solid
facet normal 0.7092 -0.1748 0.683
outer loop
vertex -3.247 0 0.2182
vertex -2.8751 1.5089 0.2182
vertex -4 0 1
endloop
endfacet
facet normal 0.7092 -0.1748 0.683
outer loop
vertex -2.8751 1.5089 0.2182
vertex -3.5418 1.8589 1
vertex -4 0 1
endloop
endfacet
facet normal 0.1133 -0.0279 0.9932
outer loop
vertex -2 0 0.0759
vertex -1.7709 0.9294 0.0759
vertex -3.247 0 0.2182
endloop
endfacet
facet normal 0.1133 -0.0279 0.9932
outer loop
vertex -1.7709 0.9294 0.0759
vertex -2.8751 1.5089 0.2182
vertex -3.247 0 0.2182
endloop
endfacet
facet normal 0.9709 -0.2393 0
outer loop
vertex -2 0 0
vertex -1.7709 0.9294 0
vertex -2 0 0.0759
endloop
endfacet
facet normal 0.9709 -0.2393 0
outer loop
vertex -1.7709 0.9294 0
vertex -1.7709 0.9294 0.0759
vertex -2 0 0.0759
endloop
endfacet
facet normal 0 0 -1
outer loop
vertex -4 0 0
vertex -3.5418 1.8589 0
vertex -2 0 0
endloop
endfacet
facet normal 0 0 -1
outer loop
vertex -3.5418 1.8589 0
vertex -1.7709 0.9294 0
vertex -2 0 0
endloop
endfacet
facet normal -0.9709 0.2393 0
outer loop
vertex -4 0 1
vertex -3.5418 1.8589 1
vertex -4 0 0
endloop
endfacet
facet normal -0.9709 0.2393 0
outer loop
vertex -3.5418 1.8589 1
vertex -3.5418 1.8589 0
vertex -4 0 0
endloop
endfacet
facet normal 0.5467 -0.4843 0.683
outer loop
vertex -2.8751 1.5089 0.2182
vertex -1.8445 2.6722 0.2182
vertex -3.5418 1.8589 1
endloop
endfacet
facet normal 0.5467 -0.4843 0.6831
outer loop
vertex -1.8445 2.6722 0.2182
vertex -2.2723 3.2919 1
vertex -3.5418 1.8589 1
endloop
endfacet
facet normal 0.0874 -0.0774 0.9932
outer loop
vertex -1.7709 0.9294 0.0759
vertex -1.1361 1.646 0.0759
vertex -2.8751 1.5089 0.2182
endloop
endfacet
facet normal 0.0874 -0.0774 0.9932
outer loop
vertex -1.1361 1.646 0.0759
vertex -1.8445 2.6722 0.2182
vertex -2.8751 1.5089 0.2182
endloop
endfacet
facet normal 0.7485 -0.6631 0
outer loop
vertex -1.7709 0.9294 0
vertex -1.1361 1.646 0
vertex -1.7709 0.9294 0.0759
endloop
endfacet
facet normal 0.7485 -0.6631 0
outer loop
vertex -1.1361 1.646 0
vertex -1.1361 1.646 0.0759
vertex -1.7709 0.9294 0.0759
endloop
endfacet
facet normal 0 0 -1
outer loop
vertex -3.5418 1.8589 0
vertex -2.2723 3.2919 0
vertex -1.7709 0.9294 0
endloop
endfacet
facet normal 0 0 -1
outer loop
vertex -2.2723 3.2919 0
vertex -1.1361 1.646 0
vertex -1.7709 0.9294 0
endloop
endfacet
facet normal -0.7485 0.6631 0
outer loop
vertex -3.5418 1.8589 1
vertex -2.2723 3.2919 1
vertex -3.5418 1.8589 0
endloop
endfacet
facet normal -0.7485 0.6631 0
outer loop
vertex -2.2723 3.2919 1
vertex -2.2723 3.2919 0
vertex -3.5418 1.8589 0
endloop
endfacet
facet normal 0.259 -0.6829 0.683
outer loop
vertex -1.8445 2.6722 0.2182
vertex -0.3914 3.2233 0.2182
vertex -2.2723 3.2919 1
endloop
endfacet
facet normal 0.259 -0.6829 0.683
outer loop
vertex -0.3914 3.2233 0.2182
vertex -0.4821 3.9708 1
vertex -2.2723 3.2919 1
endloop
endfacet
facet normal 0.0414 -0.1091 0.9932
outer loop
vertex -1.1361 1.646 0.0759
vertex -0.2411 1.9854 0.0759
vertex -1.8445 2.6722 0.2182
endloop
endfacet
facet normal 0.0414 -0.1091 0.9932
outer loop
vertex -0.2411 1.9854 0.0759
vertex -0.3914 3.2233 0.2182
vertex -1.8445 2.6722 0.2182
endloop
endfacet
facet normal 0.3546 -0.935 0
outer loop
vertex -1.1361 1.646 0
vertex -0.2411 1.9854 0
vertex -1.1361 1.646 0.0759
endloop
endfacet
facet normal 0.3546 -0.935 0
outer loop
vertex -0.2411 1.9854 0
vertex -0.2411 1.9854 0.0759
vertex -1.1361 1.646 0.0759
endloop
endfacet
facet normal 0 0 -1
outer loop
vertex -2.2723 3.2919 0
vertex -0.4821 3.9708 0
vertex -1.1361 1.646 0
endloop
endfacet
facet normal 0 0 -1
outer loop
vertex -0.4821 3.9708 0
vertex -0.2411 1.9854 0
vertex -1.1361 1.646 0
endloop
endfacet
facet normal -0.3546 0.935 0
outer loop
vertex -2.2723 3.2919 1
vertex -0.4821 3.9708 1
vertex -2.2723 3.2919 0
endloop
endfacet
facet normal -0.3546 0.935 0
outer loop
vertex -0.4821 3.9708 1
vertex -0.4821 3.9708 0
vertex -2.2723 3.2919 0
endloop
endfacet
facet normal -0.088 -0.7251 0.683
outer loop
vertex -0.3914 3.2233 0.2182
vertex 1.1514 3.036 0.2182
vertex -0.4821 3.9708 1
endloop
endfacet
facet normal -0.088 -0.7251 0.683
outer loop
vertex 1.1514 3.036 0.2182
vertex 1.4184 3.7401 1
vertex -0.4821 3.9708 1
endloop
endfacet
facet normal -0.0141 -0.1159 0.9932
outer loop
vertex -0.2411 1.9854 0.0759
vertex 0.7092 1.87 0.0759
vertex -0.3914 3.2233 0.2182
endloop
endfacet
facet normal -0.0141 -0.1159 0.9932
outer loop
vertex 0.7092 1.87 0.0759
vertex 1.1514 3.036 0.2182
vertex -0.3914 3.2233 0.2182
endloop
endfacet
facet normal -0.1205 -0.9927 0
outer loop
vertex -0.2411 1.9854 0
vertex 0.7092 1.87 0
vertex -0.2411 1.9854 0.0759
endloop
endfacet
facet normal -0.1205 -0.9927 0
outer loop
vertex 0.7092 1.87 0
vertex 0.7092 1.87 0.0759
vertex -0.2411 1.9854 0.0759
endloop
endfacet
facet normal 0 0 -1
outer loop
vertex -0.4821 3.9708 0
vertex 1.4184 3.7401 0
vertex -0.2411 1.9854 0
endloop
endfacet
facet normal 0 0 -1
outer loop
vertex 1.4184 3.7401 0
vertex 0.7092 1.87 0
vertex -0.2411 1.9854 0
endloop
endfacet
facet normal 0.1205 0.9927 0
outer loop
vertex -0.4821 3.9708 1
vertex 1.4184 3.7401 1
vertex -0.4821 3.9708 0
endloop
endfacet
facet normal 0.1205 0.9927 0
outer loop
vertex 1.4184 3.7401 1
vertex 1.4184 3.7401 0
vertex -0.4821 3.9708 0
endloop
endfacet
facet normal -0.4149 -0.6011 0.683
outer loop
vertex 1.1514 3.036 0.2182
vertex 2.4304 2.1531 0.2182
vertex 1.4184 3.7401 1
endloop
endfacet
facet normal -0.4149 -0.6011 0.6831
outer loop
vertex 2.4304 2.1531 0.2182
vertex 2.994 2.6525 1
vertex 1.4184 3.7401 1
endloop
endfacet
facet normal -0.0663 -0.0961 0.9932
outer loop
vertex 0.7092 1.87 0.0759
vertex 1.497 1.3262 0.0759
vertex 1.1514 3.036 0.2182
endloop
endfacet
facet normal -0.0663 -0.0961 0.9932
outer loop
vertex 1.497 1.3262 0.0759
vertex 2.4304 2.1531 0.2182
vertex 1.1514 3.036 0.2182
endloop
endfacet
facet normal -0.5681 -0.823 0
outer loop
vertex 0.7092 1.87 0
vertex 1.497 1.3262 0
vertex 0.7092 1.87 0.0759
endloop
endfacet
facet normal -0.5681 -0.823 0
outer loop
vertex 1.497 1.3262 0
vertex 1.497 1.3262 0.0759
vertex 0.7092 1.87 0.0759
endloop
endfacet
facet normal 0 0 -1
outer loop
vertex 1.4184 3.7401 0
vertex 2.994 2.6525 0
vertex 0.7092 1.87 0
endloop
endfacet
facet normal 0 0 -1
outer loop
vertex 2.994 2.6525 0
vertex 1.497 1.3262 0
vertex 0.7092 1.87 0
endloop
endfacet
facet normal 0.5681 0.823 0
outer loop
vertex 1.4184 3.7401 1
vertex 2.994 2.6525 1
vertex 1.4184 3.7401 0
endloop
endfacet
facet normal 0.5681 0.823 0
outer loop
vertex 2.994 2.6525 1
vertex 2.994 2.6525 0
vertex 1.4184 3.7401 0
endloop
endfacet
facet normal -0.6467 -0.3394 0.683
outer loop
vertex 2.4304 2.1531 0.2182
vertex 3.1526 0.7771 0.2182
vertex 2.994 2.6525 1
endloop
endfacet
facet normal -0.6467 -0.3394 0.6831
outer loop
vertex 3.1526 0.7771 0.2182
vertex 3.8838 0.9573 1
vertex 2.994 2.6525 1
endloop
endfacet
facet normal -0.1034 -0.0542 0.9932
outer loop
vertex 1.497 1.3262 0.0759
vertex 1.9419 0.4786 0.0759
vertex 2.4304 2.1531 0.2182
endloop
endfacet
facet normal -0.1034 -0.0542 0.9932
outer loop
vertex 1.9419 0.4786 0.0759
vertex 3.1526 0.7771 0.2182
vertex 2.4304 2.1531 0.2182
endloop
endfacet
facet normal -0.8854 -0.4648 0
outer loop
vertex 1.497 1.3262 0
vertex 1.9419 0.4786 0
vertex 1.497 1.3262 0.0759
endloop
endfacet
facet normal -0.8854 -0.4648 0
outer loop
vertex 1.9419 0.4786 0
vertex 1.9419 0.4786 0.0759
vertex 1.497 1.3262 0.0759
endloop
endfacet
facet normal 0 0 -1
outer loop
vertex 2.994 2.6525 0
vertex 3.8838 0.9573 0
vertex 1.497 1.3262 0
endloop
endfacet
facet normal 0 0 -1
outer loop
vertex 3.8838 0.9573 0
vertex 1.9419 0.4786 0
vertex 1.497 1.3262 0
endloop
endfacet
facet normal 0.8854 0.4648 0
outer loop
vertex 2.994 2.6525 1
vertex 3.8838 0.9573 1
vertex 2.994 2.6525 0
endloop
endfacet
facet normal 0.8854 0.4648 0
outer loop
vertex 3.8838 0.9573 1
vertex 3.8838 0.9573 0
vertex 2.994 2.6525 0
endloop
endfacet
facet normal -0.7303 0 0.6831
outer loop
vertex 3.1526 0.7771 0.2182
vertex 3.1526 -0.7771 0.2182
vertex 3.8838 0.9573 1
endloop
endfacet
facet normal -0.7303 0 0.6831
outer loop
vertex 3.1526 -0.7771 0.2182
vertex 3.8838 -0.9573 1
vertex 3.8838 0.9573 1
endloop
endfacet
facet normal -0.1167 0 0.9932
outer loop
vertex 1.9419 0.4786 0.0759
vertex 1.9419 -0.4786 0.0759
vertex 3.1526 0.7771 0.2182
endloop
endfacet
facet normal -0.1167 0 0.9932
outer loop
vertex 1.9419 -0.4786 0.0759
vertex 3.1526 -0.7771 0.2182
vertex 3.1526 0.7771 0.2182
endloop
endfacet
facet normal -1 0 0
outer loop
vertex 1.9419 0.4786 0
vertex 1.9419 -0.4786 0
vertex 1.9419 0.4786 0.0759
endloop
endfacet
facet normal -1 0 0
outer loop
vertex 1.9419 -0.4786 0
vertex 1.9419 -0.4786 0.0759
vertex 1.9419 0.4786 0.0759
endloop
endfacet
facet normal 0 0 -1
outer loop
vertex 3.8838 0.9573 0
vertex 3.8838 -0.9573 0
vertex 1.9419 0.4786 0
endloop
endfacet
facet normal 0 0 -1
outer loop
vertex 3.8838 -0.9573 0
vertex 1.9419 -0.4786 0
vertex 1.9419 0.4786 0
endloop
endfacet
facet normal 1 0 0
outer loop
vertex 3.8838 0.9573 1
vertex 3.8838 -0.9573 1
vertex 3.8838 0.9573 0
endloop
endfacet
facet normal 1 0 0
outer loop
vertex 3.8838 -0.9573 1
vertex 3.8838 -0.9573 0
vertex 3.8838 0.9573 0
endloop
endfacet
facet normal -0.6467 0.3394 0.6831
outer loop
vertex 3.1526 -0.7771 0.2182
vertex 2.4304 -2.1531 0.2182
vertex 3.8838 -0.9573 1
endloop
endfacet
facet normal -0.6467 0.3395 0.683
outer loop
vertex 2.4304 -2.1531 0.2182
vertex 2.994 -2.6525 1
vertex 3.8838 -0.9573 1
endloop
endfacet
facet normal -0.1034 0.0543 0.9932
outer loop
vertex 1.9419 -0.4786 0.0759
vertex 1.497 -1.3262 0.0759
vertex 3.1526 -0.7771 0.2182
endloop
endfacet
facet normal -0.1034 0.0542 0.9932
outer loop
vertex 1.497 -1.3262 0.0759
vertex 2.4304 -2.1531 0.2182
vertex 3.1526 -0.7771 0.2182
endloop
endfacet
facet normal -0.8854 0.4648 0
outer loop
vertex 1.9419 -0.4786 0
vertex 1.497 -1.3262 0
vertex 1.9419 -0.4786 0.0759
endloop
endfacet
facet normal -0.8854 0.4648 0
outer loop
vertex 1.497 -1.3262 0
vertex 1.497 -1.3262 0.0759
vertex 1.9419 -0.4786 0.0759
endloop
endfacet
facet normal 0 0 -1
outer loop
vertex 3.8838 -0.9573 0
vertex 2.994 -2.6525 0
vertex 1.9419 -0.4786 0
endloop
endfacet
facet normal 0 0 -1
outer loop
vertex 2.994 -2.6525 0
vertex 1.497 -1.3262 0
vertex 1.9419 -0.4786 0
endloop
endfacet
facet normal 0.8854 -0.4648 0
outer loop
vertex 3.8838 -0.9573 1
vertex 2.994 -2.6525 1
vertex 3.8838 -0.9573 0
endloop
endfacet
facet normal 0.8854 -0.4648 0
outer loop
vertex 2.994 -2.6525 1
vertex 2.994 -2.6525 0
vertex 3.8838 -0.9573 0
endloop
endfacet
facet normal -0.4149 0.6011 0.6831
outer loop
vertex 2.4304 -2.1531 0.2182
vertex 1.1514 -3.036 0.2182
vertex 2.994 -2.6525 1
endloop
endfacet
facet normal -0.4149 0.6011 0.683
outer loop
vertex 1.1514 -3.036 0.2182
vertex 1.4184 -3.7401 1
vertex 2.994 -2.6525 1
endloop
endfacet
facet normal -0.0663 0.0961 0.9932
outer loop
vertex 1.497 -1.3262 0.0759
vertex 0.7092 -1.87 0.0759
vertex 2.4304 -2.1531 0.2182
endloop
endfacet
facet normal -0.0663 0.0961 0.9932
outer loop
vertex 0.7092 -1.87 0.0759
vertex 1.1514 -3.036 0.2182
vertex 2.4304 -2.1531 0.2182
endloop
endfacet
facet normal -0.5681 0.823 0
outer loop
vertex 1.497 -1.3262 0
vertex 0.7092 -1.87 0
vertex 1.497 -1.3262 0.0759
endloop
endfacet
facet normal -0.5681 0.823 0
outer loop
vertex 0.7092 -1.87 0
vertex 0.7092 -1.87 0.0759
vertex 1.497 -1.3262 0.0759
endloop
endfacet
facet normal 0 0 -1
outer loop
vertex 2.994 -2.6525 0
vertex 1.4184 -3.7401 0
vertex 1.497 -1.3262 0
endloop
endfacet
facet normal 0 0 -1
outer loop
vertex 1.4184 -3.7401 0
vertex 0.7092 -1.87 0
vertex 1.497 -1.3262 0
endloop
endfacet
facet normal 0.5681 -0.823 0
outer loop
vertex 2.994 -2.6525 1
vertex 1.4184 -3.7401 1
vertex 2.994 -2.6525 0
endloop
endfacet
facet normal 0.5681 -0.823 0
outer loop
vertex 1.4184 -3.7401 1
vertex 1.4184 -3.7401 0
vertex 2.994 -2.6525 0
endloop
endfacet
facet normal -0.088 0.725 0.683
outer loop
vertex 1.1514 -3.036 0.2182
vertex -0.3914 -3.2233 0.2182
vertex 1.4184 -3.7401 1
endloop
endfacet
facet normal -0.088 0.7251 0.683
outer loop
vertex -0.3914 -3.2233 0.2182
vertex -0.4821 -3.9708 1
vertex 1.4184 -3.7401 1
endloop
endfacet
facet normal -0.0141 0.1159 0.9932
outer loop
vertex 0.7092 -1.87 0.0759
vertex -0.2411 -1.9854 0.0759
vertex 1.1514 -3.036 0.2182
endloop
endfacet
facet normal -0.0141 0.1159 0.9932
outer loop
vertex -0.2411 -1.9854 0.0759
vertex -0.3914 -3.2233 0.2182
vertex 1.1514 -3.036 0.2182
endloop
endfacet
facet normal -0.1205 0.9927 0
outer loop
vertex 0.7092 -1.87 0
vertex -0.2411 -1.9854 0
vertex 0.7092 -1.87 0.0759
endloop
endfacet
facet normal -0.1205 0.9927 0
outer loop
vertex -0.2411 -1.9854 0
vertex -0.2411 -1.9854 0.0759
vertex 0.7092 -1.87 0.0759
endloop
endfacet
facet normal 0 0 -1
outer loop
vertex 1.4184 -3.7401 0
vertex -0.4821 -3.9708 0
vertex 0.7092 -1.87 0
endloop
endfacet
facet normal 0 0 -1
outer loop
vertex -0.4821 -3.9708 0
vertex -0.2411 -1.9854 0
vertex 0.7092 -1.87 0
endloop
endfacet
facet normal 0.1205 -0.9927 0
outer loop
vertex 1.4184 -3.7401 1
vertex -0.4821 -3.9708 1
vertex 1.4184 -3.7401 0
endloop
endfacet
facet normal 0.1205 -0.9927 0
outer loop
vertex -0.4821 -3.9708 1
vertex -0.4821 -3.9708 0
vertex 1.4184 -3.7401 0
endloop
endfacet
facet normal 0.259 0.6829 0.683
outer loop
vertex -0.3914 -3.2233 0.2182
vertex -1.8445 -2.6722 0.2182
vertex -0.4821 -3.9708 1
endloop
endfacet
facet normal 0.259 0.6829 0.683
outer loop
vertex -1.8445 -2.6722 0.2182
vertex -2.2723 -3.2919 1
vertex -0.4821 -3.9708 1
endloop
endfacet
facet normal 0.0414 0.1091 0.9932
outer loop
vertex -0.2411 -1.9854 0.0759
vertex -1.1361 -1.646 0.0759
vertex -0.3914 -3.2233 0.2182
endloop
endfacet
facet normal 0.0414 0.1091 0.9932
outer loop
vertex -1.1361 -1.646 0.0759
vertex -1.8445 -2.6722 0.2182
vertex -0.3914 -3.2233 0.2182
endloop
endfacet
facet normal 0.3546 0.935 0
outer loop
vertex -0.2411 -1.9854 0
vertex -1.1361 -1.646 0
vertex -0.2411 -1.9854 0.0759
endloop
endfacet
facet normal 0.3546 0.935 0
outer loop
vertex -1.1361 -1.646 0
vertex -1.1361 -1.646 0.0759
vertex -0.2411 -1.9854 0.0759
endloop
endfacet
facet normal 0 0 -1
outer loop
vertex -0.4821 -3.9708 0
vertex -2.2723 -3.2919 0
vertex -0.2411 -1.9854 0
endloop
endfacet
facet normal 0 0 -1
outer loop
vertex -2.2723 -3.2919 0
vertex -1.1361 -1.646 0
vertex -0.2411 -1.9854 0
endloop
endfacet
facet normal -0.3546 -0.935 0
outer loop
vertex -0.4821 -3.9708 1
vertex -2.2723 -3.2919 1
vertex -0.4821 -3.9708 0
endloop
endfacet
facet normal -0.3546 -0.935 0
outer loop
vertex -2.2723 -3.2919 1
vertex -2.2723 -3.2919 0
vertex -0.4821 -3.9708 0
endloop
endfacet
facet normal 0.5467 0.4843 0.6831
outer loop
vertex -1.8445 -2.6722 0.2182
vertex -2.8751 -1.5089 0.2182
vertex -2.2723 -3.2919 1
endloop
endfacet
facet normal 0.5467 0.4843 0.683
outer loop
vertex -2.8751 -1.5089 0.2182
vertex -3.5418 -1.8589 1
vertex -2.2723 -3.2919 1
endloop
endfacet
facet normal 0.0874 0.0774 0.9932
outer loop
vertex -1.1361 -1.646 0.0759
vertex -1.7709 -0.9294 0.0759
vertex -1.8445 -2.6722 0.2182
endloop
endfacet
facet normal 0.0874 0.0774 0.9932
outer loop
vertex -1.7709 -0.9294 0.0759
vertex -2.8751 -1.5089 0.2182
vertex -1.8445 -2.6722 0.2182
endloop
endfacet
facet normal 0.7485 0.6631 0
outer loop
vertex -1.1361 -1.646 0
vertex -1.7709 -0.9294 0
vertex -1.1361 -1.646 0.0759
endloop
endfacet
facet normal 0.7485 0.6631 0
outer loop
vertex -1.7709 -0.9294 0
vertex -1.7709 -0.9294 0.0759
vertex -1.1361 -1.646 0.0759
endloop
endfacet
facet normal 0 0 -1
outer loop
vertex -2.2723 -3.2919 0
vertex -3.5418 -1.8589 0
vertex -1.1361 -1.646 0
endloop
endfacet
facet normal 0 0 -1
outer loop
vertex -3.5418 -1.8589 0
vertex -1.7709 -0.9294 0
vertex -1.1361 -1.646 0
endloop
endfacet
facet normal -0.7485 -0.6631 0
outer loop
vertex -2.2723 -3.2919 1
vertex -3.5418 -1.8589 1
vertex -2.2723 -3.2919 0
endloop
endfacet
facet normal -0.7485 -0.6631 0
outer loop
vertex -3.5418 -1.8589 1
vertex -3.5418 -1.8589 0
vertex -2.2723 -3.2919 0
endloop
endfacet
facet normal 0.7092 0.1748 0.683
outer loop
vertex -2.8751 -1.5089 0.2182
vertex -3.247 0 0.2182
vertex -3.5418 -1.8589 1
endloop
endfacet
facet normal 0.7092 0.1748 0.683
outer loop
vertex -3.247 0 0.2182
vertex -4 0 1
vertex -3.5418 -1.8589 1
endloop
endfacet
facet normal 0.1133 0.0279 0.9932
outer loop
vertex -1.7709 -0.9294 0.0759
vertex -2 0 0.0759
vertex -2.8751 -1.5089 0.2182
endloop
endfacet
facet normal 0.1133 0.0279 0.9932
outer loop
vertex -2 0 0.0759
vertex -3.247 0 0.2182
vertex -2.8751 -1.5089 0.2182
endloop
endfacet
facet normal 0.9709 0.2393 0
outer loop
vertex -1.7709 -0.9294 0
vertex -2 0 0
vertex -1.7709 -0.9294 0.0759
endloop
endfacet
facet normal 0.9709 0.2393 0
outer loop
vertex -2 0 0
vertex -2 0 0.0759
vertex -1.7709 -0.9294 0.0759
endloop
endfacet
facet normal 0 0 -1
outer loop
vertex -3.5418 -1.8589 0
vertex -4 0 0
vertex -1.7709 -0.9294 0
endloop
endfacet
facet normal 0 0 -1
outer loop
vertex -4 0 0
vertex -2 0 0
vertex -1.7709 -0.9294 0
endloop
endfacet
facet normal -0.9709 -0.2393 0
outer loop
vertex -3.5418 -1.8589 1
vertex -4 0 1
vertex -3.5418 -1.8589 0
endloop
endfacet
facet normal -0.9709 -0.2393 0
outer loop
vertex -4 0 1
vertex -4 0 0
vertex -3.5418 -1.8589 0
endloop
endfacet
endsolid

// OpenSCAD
// Fillets


// Creates a 3D fillet using rotate_extrude.
// Parameters:
//   fillet_rad — fillet radius
//   center_rad — distance from rotation center
//   inward     — mirror horizontally (true = inward, false = outward)
//   upward     — mirror vertically (true = upward, false = downward)
//   scl        — vertical scale factor
module fillet(fillet_rad, center_rad, inward = true, upward = true, scl = 1.0) {
    // Determine mirror axes
    mirror_vec = [
        inward ? 1 : 0,   // mirror X if inward
        upward ? 0 : 1    // mirror Y if downward
    ];

    // Assumes $fn is set externally
    scale([1, 1, scl])
    rotate_extrude()
    translate([center_rad, 0])
    translate([fillet_rad / 2, fillet_rad / 2])
    mirror(mirror_vec)
    translate([-fillet_rad / 2, -fillet_rad / 2])
    intersection() {
        difference() {
            square(fillet_rad * 2, center = true);
            circle(r = fillet_rad);
        }
        square(fillet_rad);
    }
}

// Example usage
fillet(2, 2, inward = false, upward = false, scl = 0.5);


//newCircularInwardFillet3D(2, 2, up=true, step=32, scl=0.5);
